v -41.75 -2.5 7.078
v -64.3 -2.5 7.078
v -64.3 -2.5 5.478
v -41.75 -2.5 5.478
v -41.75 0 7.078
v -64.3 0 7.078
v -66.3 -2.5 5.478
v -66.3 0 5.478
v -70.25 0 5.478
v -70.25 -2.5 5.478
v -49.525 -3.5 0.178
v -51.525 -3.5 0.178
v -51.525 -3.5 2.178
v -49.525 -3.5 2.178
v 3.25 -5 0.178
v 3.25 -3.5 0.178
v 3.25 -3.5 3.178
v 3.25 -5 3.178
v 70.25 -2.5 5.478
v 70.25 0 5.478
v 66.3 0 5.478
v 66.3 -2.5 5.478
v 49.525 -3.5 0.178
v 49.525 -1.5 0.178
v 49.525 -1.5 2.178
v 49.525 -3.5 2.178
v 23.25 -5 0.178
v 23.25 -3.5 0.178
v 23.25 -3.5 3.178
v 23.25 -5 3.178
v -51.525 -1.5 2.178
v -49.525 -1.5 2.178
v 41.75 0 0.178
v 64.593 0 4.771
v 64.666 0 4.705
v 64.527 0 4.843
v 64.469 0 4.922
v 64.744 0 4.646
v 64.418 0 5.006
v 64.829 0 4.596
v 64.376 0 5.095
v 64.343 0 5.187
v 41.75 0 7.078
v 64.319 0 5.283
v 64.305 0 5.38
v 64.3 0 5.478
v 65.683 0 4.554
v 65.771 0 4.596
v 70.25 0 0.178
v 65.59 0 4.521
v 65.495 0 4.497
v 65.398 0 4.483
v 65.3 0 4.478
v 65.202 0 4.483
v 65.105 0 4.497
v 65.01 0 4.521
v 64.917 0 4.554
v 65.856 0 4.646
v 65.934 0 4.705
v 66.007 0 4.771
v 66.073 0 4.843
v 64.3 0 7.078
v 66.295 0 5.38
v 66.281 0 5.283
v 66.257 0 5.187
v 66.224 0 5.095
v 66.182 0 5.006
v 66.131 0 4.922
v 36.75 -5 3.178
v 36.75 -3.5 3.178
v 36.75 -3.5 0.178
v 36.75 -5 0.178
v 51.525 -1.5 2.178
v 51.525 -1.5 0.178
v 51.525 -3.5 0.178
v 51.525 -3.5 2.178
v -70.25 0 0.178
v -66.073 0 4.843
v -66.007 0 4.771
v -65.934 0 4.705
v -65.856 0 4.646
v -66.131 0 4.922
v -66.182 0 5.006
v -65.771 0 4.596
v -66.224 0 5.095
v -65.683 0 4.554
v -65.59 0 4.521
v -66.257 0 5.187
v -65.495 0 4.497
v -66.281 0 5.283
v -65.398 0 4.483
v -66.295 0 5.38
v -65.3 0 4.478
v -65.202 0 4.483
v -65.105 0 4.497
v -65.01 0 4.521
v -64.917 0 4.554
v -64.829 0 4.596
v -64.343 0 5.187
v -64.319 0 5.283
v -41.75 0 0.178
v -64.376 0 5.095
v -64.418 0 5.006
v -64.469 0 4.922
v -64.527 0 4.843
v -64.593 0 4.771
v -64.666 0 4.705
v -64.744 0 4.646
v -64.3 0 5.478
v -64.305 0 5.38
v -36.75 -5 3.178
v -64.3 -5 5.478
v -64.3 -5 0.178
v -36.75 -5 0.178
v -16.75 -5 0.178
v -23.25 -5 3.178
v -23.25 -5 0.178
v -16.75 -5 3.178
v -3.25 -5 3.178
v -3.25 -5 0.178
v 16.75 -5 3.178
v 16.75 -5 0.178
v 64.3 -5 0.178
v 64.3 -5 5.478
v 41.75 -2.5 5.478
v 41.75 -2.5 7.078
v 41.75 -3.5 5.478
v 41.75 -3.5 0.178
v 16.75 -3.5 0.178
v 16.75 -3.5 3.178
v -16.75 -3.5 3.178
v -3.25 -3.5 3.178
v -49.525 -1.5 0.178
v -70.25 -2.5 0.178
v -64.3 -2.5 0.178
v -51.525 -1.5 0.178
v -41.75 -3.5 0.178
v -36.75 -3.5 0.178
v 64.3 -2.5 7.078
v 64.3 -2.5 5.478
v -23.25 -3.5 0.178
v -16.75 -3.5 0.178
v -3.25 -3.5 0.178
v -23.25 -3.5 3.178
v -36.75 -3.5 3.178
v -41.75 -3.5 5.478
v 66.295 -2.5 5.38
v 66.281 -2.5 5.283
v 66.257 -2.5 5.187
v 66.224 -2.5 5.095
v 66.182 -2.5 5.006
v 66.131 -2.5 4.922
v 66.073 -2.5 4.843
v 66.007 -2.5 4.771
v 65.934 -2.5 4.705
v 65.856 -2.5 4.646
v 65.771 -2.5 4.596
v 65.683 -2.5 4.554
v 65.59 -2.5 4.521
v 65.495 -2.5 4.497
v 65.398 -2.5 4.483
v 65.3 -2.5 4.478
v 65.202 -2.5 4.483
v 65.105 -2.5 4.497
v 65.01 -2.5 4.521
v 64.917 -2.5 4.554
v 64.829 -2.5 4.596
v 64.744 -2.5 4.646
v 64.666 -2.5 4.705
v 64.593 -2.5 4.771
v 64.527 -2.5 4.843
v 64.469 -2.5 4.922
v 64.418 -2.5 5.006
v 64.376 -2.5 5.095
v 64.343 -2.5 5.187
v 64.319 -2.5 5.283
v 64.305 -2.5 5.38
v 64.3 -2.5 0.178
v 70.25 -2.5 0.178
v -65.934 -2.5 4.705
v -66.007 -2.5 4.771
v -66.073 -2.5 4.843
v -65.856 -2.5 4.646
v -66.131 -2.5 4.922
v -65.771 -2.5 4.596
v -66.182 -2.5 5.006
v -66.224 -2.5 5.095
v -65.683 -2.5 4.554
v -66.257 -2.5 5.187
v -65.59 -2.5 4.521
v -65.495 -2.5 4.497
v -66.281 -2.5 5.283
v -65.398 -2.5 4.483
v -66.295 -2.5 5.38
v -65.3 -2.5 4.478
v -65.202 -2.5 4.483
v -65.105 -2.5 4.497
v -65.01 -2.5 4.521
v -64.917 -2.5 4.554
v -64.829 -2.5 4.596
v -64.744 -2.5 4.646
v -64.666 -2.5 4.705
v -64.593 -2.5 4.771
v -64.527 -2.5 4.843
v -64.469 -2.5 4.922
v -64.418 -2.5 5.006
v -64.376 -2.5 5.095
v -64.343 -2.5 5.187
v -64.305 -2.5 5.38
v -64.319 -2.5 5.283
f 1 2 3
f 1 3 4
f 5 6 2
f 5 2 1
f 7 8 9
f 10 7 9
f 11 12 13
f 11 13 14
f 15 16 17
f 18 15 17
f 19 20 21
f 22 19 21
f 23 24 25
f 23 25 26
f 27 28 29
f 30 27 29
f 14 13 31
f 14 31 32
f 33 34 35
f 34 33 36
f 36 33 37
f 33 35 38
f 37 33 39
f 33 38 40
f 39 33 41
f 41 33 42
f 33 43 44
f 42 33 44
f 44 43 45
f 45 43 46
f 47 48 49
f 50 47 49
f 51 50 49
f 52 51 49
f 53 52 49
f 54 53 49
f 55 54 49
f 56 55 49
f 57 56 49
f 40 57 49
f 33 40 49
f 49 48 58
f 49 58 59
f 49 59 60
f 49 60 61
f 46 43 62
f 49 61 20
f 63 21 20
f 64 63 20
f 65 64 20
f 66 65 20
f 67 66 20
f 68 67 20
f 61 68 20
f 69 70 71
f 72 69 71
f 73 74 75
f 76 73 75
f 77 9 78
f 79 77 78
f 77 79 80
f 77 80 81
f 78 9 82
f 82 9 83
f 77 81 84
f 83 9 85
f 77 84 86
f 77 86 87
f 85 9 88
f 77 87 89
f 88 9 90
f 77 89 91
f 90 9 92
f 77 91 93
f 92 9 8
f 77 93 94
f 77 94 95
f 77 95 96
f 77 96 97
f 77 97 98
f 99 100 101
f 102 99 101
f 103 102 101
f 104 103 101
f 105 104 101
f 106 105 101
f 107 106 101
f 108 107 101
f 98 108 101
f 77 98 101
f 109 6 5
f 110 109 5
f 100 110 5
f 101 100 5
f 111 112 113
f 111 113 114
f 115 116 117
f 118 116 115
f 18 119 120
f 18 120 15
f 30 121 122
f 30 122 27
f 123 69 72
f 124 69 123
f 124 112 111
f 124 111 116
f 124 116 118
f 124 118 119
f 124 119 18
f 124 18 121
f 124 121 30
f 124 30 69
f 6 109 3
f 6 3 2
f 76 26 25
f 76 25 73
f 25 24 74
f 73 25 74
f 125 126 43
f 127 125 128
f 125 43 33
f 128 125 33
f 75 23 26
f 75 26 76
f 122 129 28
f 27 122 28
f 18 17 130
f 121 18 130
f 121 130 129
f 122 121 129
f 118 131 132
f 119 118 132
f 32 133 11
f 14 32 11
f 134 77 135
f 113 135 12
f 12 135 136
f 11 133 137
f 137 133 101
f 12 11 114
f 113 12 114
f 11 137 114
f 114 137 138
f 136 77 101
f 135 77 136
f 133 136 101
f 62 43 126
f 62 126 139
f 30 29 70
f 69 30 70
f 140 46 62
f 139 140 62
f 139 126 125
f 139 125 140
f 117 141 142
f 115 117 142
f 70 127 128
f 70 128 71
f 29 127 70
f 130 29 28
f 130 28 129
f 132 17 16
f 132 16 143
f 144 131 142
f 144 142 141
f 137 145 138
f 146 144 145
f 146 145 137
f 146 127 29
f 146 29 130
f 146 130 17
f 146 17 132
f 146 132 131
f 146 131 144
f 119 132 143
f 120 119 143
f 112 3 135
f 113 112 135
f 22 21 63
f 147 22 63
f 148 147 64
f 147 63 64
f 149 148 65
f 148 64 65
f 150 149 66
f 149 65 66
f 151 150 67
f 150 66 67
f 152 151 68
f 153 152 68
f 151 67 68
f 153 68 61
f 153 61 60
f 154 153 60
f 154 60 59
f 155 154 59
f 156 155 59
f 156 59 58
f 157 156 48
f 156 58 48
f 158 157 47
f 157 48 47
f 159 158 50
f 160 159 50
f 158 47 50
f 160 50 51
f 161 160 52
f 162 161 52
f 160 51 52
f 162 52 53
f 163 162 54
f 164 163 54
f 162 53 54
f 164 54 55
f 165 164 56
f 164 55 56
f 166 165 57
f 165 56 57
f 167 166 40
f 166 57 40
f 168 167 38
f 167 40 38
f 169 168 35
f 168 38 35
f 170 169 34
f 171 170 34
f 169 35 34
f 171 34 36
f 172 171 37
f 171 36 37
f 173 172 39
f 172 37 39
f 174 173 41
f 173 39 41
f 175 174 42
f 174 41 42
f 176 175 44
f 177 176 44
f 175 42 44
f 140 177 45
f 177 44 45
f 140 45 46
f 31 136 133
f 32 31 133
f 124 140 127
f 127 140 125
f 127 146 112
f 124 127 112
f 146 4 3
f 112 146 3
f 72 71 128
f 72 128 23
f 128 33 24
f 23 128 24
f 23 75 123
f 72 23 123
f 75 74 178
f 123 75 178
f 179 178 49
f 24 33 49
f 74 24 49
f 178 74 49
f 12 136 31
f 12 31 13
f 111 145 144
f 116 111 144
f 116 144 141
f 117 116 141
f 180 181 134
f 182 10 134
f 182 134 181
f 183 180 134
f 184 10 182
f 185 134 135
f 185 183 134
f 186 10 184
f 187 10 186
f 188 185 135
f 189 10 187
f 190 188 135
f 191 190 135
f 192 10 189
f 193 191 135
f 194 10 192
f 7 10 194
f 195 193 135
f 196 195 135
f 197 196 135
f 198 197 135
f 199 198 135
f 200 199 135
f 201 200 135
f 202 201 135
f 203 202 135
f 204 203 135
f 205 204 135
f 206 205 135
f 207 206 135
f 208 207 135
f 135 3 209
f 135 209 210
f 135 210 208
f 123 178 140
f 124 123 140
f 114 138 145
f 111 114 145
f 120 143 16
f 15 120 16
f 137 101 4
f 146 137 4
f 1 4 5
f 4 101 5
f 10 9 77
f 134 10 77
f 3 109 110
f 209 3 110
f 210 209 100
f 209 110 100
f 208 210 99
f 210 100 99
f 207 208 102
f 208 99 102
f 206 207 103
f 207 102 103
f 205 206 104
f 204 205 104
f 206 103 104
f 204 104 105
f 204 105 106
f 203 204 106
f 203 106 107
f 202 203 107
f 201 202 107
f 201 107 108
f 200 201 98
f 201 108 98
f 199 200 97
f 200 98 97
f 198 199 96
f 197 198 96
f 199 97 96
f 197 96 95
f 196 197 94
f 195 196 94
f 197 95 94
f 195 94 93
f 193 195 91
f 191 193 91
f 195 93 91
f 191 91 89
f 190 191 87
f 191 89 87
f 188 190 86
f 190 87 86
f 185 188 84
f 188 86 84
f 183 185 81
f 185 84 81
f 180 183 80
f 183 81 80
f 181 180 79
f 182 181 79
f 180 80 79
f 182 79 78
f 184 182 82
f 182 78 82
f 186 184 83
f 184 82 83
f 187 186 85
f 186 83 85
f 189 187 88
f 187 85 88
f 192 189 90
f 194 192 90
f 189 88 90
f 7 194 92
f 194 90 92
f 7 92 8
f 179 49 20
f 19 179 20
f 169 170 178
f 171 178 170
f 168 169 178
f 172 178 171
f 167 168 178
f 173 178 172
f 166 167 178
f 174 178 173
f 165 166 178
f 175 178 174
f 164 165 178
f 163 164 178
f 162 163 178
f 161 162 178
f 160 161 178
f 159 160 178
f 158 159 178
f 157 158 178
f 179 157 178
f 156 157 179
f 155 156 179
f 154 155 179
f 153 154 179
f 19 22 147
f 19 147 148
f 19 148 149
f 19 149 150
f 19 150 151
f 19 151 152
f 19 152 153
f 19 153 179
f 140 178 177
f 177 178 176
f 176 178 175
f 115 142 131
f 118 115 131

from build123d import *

# Parameters (mm, degrees)
F1_DEPTH = 5
F0_W     = 128.6
F0_H     = 1.6
F2_DEPTH = 2.5
F3_W     = 2
F3_H     = 2
F4_DEPTH = 2
F5_W     = 2
F5_H     = 2
F6_DEPTH = 2
F8_DEPTH = 3.5


with BuildPart() as f1:
    # F0 (on Front) → F1 (new body)
    with BuildSketch(Plane.XZ):
        Polygon((64.3, 0.177778), (64.3, 5.477778), (-64.3, 5.477778), (-64.3, 0.177778), (-36.75, 0.177778), (-36.75, 3.177778), (-23.25, 3.177778), (-23.25, 0.177778), (-16.75, 0.177778), (-16.75, 3.177778), (-3.25, 3.177778), (-3.25, 0.177778), (3.25, 0.177778), (3.25, 3.177778), (16.75, 3.177778), (16.75, 0.177778), (23.25, 0.177778), (23.25, 3.177778), (36.75, 3.177778), (36.75, 0.177778), align=None)
    extrude(amount=F1_DEPTH)

    # F0 (on Front) → F2 (join)
    with BuildSketch(Plane.XZ):
        with BuildLine():
            Line((-64.3, 0.177778), (-64.3, 5.477778))
            ThreePointArc((-64.3, 5.477778), (-65.3, 4.477778), (-66.3, 5.477778))
            Line((-66.3, 5.477778), (-70.25, 5.477778))
            Line((-70.25, 5.477778), (-70.25, 0.177778))
            Line((-70.25, 0.177778), (-64.3, 0.177778))
        make_face()
        with Locations((0, 6.277778)):
            Rectangle(F0_W, F0_H)
        with BuildLine():
            ThreePointArc((66.3, 5.477778), (65.3, 4.477778), (64.3, 5.477778))
            Line((64.3, 5.477778), (64.3, 0.177778))
            Line((64.3, 0.177778), (70.25, 0.177778))
            Line((70.25, 0.177778), (70.25, 5.477778))
            Line((70.25, 5.477778), (66.3, 5.477778))
        make_face()
    extrude(amount=F2_DEPTH)

    # F3 (on face) → F4 (cut)
    with BuildSketch(Plane(origin=(0, 0, 0.177778), x_dir=(1, 0, 0), z_dir=(0, 0, -1))):
        with Locations((50.525, 2.5)):
            Rectangle(F3_W, F3_H)
    extrude(amount=-F4_DEPTH, mode=Mode.SUBTRACT)

    # F5 (on face) → F6 (cut)
    with BuildSketch(Plane(origin=(0, 0, 0.177778), x_dir=(1, 0, 0), z_dir=(0, 0, -1))):
        with Locations((-50.525, 2.5)):
            Rectangle(F5_W, F5_H)
    extrude(amount=-F6_DEPTH, mode=Mode.SUBTRACT)

    # F7 (on face) → F8 (cut)
    with BuildSketch(Plane(origin=(0, 0, 0), x_dir=(-1, 0, 0), z_dir=(0, 1, 0))):
        Polygon((-41.75, 7.077778), (-41.75, 0.177778), (-36.75, 0.177778), (-36.75, 3.177778), (-23.25, 3.177778), (-23.25, 0.177778), (-16.75, 0.177778), (-16.75, 3.177778), (-3.25, 3.177778), (-3.25, 0.177778), (3.25, 0.177778), (3.25, 3.177778), (16.75, 3.177778), (16.75, 0.177778), (23.25, 0.177778), (23.25, 3.177778), (36.75, 3.177778), (36.75, 0.177778), (41.75, 0.177778), (41.75, 7.077778), align=None)
    extrude(amount=-F8_DEPTH, mode=Mode.SUBTRACT)


solid = f1.part
